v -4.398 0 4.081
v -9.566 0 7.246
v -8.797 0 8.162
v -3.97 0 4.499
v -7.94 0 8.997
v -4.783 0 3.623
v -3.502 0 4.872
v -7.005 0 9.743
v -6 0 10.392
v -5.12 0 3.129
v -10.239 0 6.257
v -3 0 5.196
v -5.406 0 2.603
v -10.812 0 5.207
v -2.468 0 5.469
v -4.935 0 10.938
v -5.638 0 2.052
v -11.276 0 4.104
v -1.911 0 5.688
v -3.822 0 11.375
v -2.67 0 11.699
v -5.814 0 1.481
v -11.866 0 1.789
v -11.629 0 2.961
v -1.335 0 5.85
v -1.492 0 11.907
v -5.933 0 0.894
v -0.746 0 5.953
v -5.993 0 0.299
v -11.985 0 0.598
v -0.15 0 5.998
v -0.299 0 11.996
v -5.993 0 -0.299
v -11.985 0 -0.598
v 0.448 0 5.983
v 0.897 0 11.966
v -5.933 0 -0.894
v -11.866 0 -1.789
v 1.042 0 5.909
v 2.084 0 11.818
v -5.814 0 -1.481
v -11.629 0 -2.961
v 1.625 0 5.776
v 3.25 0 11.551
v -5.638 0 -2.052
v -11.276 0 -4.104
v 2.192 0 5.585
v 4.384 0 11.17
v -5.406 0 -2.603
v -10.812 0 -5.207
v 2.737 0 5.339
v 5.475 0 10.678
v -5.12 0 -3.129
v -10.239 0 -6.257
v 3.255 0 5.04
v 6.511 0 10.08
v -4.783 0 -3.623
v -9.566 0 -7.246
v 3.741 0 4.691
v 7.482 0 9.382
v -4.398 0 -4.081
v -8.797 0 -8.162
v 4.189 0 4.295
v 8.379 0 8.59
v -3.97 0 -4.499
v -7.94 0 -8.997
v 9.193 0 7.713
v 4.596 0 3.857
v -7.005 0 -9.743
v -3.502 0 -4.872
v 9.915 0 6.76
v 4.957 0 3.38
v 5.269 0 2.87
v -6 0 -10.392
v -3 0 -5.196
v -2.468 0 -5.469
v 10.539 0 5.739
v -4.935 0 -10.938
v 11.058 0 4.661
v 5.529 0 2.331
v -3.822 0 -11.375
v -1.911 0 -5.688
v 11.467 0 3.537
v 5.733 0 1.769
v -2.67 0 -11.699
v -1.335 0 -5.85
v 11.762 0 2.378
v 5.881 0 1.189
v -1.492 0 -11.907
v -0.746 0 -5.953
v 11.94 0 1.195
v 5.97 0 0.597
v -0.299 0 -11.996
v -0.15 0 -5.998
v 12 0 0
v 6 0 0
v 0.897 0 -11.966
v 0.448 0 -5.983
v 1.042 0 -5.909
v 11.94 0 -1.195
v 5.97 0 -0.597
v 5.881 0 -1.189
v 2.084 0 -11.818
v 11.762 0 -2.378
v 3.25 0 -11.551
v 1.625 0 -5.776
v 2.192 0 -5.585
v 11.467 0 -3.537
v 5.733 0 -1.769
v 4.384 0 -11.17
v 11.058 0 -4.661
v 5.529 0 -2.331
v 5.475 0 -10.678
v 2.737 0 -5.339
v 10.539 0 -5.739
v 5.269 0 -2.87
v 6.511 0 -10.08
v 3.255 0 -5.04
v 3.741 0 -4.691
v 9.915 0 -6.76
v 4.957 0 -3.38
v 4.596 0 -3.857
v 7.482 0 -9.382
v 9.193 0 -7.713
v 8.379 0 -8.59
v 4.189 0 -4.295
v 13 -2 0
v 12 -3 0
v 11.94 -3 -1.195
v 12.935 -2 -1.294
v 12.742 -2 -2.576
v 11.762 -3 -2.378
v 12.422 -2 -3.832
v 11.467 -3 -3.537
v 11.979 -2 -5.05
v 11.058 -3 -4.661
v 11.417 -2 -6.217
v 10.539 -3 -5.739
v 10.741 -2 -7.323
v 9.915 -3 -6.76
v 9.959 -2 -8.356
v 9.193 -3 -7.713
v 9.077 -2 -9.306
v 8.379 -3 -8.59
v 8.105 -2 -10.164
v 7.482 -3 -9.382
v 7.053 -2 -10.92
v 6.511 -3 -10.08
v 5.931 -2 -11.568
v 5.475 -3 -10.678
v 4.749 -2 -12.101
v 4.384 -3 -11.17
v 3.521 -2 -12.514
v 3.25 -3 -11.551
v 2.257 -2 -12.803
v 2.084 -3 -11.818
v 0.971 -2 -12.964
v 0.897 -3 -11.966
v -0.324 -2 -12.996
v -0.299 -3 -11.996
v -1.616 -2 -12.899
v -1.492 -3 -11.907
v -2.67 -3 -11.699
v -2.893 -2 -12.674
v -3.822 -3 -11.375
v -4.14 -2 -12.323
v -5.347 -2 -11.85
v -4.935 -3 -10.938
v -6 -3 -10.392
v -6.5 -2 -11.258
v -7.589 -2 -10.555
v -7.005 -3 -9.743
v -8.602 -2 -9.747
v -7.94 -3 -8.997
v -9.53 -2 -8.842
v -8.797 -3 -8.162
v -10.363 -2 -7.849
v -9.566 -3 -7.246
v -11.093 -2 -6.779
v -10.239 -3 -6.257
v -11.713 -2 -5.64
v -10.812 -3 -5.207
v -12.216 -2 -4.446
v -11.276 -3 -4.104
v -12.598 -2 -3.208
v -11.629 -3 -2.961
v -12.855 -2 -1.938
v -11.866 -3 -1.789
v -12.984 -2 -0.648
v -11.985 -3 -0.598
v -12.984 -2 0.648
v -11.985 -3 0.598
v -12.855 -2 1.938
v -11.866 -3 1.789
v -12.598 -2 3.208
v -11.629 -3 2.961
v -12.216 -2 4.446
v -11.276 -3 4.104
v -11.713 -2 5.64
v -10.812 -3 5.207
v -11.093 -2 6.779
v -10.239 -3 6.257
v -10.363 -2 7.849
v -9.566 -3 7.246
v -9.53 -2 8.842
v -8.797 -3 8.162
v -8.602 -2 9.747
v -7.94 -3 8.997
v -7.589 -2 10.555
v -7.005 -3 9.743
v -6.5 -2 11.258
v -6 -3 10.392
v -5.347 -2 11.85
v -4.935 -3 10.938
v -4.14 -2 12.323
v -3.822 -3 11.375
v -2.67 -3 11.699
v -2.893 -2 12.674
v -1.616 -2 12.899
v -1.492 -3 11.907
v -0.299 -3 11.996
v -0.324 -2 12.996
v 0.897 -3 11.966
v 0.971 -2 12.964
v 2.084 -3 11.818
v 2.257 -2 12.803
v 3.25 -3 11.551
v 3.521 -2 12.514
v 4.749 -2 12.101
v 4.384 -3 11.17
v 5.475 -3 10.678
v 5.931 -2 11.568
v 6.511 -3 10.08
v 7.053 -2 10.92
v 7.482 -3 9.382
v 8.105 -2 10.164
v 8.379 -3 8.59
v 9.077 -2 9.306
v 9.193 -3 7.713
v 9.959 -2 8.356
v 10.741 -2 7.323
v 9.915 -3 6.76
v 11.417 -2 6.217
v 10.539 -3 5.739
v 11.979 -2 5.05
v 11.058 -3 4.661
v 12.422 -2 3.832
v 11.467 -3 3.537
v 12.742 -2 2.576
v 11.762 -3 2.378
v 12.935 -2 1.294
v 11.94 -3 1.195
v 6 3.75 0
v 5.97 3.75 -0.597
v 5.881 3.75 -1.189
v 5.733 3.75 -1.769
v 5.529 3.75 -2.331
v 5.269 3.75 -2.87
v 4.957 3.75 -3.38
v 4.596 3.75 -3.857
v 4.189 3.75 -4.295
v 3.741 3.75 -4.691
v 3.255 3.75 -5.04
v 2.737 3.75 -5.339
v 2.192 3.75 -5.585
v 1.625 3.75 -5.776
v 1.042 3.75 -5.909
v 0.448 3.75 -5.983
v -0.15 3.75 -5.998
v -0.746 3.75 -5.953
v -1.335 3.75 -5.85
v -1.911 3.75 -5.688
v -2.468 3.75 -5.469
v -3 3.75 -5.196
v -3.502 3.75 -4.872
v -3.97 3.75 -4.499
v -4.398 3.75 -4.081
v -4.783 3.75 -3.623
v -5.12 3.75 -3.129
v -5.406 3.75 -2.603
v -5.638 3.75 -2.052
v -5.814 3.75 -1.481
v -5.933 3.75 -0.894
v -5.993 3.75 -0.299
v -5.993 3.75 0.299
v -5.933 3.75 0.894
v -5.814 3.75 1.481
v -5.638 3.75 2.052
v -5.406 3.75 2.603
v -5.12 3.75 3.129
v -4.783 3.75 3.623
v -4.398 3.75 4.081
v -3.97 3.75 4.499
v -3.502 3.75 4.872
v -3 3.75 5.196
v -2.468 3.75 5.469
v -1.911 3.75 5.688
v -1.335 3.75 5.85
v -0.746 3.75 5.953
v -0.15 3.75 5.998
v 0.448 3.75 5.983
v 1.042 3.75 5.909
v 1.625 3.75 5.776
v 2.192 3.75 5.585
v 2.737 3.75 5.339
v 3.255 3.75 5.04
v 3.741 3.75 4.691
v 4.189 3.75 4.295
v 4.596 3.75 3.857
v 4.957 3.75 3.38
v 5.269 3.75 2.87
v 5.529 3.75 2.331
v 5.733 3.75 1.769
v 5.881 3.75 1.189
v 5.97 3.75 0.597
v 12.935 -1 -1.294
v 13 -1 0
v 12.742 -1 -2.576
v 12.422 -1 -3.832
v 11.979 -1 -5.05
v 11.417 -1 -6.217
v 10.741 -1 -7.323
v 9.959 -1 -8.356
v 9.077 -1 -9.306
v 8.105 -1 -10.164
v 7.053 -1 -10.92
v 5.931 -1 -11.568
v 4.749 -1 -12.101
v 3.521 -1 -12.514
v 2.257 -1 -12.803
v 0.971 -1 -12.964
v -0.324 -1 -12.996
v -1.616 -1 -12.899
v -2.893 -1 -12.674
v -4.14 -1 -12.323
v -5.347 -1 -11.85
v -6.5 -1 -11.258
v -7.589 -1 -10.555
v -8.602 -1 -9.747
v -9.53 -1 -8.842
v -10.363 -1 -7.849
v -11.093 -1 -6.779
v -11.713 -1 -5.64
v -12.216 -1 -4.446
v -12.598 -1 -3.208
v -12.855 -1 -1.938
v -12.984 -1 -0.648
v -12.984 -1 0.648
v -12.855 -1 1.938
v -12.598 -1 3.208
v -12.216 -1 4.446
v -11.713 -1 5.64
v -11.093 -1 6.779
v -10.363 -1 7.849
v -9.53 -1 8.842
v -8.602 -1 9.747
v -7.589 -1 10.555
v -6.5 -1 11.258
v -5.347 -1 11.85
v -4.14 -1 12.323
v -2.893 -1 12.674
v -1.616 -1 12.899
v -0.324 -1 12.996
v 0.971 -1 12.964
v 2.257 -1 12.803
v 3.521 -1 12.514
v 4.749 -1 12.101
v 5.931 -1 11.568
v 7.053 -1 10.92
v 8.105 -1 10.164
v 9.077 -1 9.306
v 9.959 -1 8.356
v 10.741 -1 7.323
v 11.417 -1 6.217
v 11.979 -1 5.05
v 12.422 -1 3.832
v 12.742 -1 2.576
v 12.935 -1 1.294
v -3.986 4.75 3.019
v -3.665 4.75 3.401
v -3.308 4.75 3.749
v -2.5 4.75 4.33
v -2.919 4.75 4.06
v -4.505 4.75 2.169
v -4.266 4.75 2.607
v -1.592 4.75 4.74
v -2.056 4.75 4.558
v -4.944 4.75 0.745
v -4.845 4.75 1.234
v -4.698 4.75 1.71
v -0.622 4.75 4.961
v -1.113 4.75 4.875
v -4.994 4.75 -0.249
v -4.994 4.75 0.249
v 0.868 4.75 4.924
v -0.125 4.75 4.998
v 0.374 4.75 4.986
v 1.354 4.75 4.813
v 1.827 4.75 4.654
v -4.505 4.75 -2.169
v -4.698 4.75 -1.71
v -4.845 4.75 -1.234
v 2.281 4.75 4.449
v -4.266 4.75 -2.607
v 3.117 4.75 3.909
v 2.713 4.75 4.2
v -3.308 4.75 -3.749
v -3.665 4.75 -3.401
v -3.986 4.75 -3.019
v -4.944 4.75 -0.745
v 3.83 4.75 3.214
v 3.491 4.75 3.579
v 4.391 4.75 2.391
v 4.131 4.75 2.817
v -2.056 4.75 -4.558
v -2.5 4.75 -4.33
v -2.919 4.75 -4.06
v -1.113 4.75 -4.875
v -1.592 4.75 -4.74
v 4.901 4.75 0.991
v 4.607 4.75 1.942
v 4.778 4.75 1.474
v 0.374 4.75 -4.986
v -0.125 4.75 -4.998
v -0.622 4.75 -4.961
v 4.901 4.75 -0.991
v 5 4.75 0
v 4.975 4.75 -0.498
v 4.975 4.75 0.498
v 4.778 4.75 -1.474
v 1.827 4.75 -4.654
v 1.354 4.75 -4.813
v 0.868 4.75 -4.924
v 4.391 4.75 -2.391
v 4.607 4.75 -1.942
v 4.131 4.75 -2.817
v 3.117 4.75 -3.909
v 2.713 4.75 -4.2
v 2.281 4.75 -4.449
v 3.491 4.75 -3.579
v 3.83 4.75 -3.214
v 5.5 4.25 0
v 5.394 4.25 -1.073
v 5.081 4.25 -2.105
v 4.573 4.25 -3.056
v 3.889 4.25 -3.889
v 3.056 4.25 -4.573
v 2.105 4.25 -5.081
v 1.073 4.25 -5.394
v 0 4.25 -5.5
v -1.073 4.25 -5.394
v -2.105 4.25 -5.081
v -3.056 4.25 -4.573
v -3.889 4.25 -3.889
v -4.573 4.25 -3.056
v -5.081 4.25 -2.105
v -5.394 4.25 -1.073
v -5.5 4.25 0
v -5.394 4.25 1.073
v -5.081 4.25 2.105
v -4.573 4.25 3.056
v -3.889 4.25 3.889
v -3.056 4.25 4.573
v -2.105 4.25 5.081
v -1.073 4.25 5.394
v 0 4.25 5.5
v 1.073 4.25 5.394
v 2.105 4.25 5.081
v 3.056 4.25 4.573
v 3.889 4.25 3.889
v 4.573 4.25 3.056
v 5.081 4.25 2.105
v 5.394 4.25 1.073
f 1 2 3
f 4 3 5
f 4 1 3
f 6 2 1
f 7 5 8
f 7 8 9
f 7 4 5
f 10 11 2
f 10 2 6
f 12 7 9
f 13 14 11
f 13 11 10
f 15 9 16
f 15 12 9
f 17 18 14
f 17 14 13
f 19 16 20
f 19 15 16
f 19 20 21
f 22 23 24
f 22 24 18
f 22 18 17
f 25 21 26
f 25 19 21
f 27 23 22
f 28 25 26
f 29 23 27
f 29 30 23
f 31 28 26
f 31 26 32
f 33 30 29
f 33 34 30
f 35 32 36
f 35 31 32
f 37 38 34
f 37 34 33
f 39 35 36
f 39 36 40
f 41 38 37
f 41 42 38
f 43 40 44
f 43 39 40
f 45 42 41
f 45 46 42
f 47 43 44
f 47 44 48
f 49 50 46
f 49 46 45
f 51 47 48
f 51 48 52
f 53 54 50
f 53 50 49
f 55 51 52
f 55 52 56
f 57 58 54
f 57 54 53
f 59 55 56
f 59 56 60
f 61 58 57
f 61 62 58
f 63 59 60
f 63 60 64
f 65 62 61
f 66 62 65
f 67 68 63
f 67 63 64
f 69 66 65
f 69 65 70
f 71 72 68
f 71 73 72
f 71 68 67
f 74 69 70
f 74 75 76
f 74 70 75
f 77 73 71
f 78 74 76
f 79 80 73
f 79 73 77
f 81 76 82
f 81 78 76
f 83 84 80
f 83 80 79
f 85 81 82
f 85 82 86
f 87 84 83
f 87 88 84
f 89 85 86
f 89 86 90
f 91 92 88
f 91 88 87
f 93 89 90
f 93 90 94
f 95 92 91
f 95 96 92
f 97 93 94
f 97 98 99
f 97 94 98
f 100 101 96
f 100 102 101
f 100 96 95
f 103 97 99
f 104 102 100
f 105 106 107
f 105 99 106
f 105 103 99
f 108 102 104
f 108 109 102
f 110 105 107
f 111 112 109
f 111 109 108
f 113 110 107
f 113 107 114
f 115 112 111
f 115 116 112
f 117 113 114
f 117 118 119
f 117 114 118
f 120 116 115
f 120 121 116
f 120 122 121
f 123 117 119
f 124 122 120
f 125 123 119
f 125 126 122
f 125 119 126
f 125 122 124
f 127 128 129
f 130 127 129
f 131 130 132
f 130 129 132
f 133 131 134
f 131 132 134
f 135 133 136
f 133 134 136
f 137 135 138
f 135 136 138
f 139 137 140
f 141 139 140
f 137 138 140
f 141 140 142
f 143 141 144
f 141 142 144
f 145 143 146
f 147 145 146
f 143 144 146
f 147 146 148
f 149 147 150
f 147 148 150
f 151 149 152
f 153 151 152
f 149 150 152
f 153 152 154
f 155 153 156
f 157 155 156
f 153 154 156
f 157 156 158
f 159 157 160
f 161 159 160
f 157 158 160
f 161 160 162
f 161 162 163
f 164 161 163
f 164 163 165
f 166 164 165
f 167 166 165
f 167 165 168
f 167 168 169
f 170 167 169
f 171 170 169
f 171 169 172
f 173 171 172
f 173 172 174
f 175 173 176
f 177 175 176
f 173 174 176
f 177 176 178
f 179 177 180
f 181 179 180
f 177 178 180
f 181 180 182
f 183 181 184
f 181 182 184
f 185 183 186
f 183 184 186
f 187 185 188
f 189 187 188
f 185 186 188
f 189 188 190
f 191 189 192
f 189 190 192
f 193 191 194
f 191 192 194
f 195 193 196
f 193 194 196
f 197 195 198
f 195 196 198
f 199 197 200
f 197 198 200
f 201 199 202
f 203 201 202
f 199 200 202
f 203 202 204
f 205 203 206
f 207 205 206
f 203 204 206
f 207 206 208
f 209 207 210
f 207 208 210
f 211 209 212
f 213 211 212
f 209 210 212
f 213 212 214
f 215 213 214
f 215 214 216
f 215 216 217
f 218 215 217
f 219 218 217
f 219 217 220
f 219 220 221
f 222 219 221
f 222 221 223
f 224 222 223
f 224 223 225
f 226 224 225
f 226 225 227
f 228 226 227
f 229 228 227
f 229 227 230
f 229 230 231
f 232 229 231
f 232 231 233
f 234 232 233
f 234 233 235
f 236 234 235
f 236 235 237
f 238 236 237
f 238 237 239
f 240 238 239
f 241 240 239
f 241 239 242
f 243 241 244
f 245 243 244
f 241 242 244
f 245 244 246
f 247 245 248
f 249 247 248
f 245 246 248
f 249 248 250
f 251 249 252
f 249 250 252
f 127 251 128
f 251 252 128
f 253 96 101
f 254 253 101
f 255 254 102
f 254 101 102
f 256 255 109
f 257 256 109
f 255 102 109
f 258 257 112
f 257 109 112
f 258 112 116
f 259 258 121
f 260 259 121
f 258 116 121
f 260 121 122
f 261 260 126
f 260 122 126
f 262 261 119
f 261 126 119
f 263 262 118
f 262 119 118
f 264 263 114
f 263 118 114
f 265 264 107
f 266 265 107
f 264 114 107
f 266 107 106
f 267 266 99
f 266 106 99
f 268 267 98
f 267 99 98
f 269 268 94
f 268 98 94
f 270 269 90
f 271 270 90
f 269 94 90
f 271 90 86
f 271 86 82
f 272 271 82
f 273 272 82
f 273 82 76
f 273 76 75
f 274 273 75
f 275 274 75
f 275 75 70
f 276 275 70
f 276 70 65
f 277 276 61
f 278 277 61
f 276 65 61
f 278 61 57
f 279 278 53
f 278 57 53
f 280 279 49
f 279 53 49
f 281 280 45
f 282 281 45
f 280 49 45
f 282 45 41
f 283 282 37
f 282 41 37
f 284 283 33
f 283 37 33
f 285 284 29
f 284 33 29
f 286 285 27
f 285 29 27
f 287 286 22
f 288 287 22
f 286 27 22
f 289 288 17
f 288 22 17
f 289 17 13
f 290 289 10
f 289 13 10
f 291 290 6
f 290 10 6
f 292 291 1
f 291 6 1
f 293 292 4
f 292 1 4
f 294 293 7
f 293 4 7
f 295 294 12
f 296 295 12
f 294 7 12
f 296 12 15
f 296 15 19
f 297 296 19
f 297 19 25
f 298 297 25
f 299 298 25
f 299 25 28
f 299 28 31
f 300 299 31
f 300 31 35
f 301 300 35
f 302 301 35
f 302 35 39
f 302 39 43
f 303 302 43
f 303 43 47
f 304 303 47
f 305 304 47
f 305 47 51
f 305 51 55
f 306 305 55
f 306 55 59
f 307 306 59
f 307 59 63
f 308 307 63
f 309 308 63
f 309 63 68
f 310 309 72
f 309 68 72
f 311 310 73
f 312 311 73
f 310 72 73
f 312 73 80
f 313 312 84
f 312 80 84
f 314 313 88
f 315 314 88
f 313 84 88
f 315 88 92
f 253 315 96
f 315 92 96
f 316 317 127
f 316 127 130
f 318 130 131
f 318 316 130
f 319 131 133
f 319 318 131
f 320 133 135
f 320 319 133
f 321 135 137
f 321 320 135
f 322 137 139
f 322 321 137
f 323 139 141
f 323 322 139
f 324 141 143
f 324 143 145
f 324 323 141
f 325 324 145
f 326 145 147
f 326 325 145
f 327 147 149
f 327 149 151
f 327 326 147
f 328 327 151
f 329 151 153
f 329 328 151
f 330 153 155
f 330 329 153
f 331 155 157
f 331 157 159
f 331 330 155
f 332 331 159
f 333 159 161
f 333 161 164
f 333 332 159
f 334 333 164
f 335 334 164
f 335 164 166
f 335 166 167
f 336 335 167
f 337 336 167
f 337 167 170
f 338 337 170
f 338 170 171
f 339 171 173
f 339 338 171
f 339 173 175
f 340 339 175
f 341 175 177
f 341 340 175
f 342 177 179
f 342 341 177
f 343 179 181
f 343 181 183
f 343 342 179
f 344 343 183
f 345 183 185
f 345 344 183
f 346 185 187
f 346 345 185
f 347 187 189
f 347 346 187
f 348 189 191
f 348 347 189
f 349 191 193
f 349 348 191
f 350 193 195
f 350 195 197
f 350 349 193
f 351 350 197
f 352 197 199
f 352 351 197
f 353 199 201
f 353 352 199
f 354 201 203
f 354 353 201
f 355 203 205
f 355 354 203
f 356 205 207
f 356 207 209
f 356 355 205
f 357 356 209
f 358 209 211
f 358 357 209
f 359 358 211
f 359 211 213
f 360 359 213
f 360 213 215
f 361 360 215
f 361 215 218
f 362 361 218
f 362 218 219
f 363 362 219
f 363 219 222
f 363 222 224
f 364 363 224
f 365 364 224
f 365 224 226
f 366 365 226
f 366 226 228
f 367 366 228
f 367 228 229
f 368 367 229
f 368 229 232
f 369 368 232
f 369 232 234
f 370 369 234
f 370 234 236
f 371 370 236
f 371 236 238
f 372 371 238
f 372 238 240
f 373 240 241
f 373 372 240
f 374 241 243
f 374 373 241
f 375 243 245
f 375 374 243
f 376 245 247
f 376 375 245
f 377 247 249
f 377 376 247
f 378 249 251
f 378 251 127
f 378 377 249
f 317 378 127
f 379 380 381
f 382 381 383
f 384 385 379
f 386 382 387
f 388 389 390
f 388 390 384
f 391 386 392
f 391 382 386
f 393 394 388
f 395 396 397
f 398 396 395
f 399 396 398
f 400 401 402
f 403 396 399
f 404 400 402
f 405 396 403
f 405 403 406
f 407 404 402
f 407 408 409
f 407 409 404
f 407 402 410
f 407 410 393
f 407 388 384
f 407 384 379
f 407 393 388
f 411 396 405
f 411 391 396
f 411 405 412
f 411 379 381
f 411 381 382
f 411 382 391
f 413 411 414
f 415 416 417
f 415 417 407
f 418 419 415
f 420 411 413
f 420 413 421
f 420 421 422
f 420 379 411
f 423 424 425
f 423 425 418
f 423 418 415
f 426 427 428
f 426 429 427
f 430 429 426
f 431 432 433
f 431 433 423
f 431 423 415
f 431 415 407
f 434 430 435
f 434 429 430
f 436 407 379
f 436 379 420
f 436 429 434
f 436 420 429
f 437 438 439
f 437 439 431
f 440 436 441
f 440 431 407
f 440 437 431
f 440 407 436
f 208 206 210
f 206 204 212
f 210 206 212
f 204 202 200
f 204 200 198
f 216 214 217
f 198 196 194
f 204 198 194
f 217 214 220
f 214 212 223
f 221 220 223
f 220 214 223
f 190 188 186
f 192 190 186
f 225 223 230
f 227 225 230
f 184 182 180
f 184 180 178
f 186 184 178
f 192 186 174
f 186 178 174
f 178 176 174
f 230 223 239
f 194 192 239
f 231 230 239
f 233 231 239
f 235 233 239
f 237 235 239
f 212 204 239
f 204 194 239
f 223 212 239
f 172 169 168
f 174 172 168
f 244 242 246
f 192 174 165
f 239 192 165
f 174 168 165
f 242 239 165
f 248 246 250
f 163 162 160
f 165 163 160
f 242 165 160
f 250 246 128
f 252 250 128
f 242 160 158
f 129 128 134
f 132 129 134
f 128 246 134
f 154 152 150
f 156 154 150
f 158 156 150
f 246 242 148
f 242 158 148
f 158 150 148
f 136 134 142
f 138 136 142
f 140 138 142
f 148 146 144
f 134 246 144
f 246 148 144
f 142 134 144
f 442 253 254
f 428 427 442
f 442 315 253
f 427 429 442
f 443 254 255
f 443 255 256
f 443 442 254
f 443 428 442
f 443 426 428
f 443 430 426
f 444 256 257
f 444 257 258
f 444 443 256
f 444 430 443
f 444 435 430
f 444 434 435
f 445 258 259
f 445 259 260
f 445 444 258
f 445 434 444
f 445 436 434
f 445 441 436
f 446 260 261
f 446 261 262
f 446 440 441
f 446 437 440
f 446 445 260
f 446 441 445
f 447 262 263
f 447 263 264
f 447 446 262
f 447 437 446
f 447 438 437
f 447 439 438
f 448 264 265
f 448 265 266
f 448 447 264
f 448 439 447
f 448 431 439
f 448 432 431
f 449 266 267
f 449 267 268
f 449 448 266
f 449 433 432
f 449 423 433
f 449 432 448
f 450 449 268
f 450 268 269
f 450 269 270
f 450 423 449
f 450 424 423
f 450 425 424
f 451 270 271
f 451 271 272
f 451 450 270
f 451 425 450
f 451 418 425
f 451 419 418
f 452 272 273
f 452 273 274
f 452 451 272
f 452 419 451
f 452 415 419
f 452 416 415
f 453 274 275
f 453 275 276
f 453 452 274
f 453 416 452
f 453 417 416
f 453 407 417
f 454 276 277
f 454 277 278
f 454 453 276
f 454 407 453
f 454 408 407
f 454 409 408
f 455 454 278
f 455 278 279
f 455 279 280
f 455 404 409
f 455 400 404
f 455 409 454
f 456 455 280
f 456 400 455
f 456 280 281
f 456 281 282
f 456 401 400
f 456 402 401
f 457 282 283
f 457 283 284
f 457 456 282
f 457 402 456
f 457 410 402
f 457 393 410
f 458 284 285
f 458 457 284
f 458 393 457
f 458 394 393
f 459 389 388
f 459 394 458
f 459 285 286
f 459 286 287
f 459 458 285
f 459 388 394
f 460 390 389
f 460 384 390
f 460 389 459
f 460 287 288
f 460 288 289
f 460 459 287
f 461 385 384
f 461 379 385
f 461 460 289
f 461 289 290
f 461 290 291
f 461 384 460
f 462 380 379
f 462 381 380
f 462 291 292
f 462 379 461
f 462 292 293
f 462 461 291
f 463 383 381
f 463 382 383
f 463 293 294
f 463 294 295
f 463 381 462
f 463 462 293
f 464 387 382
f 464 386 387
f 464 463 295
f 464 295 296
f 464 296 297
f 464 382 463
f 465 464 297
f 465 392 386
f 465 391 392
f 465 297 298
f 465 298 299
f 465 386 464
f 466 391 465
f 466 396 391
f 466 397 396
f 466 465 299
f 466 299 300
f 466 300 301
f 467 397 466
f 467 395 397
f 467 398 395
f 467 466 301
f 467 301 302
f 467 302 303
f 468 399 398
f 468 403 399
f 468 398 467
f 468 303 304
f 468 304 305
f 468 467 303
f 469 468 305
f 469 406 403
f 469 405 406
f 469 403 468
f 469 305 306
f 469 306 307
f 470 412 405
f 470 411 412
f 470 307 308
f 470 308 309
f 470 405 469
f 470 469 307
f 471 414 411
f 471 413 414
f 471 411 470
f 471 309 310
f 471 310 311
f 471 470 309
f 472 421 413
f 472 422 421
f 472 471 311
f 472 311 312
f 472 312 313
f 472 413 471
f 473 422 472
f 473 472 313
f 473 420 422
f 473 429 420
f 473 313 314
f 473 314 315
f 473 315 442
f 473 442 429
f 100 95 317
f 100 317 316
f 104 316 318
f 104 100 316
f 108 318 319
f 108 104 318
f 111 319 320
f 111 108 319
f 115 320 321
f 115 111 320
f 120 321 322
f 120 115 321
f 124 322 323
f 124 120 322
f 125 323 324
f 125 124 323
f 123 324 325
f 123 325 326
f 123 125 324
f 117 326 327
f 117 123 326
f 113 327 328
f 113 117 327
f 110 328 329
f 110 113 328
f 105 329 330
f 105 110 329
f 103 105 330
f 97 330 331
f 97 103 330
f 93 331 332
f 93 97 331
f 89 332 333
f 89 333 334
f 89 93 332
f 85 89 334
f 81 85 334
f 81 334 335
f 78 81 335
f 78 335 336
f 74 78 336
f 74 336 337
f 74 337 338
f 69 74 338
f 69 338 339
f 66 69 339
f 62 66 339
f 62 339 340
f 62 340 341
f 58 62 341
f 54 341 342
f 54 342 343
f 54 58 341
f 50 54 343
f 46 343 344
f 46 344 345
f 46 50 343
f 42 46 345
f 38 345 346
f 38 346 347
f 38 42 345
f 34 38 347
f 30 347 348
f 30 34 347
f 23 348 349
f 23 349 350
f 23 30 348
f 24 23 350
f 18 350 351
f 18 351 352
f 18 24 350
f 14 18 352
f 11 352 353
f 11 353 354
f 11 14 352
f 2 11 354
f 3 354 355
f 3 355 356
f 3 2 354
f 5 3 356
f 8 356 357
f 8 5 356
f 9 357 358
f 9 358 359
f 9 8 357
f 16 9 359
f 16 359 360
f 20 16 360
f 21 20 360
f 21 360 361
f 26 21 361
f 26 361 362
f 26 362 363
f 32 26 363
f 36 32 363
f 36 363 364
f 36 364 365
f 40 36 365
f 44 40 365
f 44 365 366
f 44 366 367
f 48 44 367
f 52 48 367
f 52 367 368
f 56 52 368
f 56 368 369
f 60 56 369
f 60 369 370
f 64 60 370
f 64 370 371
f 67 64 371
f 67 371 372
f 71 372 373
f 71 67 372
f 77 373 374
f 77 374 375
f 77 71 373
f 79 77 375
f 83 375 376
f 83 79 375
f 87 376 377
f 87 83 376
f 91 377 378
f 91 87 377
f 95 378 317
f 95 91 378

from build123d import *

# Parameters (mm, degrees)
CROQUIS1_R              = 6
SALIENTE_EXTRUIR1_DEPTH = 4.75
CROQUIS1_3_R            = 13
SALIENTE_EXTRUIR2_DEPTH = 3
CHAFL_N1_SIZE           = 1


with BuildPart() as part:
    # Croquis1 → Saliente-Extruir1 (new body)
    with BuildSketch(Plane(origin=(0, 0, 0), x_dir=(1, 0, 0), z_dir=(0, 1, 0))):
        Circle(CROQUIS1_R)
    extrude(amount=SALIENTE_EXTRUIR1_DEPTH)

    # Croquis1<3> → Saliente-Extruir2 (add)
    with BuildSketch(Plane(origin=(0, 0, 0), x_dir=(1, 0, 0), z_dir=(0, 1, 0))):
        Circle(CROQUIS1_3_R)
    extrude(amount=-SALIENTE_EXTRUIR2_DEPTH)

    # Chaflán1
    chafl_n1_edges = [part.edges().sort_by_distance(p)[0] for p in [
        (-6, 4.75, 0),
        (-13, -3, 0),
        (-13, 0, 0),
    ]]
    chamfer(chafl_n1_edges, length=CHAFL_N1_SIZE)


solid = part.part
